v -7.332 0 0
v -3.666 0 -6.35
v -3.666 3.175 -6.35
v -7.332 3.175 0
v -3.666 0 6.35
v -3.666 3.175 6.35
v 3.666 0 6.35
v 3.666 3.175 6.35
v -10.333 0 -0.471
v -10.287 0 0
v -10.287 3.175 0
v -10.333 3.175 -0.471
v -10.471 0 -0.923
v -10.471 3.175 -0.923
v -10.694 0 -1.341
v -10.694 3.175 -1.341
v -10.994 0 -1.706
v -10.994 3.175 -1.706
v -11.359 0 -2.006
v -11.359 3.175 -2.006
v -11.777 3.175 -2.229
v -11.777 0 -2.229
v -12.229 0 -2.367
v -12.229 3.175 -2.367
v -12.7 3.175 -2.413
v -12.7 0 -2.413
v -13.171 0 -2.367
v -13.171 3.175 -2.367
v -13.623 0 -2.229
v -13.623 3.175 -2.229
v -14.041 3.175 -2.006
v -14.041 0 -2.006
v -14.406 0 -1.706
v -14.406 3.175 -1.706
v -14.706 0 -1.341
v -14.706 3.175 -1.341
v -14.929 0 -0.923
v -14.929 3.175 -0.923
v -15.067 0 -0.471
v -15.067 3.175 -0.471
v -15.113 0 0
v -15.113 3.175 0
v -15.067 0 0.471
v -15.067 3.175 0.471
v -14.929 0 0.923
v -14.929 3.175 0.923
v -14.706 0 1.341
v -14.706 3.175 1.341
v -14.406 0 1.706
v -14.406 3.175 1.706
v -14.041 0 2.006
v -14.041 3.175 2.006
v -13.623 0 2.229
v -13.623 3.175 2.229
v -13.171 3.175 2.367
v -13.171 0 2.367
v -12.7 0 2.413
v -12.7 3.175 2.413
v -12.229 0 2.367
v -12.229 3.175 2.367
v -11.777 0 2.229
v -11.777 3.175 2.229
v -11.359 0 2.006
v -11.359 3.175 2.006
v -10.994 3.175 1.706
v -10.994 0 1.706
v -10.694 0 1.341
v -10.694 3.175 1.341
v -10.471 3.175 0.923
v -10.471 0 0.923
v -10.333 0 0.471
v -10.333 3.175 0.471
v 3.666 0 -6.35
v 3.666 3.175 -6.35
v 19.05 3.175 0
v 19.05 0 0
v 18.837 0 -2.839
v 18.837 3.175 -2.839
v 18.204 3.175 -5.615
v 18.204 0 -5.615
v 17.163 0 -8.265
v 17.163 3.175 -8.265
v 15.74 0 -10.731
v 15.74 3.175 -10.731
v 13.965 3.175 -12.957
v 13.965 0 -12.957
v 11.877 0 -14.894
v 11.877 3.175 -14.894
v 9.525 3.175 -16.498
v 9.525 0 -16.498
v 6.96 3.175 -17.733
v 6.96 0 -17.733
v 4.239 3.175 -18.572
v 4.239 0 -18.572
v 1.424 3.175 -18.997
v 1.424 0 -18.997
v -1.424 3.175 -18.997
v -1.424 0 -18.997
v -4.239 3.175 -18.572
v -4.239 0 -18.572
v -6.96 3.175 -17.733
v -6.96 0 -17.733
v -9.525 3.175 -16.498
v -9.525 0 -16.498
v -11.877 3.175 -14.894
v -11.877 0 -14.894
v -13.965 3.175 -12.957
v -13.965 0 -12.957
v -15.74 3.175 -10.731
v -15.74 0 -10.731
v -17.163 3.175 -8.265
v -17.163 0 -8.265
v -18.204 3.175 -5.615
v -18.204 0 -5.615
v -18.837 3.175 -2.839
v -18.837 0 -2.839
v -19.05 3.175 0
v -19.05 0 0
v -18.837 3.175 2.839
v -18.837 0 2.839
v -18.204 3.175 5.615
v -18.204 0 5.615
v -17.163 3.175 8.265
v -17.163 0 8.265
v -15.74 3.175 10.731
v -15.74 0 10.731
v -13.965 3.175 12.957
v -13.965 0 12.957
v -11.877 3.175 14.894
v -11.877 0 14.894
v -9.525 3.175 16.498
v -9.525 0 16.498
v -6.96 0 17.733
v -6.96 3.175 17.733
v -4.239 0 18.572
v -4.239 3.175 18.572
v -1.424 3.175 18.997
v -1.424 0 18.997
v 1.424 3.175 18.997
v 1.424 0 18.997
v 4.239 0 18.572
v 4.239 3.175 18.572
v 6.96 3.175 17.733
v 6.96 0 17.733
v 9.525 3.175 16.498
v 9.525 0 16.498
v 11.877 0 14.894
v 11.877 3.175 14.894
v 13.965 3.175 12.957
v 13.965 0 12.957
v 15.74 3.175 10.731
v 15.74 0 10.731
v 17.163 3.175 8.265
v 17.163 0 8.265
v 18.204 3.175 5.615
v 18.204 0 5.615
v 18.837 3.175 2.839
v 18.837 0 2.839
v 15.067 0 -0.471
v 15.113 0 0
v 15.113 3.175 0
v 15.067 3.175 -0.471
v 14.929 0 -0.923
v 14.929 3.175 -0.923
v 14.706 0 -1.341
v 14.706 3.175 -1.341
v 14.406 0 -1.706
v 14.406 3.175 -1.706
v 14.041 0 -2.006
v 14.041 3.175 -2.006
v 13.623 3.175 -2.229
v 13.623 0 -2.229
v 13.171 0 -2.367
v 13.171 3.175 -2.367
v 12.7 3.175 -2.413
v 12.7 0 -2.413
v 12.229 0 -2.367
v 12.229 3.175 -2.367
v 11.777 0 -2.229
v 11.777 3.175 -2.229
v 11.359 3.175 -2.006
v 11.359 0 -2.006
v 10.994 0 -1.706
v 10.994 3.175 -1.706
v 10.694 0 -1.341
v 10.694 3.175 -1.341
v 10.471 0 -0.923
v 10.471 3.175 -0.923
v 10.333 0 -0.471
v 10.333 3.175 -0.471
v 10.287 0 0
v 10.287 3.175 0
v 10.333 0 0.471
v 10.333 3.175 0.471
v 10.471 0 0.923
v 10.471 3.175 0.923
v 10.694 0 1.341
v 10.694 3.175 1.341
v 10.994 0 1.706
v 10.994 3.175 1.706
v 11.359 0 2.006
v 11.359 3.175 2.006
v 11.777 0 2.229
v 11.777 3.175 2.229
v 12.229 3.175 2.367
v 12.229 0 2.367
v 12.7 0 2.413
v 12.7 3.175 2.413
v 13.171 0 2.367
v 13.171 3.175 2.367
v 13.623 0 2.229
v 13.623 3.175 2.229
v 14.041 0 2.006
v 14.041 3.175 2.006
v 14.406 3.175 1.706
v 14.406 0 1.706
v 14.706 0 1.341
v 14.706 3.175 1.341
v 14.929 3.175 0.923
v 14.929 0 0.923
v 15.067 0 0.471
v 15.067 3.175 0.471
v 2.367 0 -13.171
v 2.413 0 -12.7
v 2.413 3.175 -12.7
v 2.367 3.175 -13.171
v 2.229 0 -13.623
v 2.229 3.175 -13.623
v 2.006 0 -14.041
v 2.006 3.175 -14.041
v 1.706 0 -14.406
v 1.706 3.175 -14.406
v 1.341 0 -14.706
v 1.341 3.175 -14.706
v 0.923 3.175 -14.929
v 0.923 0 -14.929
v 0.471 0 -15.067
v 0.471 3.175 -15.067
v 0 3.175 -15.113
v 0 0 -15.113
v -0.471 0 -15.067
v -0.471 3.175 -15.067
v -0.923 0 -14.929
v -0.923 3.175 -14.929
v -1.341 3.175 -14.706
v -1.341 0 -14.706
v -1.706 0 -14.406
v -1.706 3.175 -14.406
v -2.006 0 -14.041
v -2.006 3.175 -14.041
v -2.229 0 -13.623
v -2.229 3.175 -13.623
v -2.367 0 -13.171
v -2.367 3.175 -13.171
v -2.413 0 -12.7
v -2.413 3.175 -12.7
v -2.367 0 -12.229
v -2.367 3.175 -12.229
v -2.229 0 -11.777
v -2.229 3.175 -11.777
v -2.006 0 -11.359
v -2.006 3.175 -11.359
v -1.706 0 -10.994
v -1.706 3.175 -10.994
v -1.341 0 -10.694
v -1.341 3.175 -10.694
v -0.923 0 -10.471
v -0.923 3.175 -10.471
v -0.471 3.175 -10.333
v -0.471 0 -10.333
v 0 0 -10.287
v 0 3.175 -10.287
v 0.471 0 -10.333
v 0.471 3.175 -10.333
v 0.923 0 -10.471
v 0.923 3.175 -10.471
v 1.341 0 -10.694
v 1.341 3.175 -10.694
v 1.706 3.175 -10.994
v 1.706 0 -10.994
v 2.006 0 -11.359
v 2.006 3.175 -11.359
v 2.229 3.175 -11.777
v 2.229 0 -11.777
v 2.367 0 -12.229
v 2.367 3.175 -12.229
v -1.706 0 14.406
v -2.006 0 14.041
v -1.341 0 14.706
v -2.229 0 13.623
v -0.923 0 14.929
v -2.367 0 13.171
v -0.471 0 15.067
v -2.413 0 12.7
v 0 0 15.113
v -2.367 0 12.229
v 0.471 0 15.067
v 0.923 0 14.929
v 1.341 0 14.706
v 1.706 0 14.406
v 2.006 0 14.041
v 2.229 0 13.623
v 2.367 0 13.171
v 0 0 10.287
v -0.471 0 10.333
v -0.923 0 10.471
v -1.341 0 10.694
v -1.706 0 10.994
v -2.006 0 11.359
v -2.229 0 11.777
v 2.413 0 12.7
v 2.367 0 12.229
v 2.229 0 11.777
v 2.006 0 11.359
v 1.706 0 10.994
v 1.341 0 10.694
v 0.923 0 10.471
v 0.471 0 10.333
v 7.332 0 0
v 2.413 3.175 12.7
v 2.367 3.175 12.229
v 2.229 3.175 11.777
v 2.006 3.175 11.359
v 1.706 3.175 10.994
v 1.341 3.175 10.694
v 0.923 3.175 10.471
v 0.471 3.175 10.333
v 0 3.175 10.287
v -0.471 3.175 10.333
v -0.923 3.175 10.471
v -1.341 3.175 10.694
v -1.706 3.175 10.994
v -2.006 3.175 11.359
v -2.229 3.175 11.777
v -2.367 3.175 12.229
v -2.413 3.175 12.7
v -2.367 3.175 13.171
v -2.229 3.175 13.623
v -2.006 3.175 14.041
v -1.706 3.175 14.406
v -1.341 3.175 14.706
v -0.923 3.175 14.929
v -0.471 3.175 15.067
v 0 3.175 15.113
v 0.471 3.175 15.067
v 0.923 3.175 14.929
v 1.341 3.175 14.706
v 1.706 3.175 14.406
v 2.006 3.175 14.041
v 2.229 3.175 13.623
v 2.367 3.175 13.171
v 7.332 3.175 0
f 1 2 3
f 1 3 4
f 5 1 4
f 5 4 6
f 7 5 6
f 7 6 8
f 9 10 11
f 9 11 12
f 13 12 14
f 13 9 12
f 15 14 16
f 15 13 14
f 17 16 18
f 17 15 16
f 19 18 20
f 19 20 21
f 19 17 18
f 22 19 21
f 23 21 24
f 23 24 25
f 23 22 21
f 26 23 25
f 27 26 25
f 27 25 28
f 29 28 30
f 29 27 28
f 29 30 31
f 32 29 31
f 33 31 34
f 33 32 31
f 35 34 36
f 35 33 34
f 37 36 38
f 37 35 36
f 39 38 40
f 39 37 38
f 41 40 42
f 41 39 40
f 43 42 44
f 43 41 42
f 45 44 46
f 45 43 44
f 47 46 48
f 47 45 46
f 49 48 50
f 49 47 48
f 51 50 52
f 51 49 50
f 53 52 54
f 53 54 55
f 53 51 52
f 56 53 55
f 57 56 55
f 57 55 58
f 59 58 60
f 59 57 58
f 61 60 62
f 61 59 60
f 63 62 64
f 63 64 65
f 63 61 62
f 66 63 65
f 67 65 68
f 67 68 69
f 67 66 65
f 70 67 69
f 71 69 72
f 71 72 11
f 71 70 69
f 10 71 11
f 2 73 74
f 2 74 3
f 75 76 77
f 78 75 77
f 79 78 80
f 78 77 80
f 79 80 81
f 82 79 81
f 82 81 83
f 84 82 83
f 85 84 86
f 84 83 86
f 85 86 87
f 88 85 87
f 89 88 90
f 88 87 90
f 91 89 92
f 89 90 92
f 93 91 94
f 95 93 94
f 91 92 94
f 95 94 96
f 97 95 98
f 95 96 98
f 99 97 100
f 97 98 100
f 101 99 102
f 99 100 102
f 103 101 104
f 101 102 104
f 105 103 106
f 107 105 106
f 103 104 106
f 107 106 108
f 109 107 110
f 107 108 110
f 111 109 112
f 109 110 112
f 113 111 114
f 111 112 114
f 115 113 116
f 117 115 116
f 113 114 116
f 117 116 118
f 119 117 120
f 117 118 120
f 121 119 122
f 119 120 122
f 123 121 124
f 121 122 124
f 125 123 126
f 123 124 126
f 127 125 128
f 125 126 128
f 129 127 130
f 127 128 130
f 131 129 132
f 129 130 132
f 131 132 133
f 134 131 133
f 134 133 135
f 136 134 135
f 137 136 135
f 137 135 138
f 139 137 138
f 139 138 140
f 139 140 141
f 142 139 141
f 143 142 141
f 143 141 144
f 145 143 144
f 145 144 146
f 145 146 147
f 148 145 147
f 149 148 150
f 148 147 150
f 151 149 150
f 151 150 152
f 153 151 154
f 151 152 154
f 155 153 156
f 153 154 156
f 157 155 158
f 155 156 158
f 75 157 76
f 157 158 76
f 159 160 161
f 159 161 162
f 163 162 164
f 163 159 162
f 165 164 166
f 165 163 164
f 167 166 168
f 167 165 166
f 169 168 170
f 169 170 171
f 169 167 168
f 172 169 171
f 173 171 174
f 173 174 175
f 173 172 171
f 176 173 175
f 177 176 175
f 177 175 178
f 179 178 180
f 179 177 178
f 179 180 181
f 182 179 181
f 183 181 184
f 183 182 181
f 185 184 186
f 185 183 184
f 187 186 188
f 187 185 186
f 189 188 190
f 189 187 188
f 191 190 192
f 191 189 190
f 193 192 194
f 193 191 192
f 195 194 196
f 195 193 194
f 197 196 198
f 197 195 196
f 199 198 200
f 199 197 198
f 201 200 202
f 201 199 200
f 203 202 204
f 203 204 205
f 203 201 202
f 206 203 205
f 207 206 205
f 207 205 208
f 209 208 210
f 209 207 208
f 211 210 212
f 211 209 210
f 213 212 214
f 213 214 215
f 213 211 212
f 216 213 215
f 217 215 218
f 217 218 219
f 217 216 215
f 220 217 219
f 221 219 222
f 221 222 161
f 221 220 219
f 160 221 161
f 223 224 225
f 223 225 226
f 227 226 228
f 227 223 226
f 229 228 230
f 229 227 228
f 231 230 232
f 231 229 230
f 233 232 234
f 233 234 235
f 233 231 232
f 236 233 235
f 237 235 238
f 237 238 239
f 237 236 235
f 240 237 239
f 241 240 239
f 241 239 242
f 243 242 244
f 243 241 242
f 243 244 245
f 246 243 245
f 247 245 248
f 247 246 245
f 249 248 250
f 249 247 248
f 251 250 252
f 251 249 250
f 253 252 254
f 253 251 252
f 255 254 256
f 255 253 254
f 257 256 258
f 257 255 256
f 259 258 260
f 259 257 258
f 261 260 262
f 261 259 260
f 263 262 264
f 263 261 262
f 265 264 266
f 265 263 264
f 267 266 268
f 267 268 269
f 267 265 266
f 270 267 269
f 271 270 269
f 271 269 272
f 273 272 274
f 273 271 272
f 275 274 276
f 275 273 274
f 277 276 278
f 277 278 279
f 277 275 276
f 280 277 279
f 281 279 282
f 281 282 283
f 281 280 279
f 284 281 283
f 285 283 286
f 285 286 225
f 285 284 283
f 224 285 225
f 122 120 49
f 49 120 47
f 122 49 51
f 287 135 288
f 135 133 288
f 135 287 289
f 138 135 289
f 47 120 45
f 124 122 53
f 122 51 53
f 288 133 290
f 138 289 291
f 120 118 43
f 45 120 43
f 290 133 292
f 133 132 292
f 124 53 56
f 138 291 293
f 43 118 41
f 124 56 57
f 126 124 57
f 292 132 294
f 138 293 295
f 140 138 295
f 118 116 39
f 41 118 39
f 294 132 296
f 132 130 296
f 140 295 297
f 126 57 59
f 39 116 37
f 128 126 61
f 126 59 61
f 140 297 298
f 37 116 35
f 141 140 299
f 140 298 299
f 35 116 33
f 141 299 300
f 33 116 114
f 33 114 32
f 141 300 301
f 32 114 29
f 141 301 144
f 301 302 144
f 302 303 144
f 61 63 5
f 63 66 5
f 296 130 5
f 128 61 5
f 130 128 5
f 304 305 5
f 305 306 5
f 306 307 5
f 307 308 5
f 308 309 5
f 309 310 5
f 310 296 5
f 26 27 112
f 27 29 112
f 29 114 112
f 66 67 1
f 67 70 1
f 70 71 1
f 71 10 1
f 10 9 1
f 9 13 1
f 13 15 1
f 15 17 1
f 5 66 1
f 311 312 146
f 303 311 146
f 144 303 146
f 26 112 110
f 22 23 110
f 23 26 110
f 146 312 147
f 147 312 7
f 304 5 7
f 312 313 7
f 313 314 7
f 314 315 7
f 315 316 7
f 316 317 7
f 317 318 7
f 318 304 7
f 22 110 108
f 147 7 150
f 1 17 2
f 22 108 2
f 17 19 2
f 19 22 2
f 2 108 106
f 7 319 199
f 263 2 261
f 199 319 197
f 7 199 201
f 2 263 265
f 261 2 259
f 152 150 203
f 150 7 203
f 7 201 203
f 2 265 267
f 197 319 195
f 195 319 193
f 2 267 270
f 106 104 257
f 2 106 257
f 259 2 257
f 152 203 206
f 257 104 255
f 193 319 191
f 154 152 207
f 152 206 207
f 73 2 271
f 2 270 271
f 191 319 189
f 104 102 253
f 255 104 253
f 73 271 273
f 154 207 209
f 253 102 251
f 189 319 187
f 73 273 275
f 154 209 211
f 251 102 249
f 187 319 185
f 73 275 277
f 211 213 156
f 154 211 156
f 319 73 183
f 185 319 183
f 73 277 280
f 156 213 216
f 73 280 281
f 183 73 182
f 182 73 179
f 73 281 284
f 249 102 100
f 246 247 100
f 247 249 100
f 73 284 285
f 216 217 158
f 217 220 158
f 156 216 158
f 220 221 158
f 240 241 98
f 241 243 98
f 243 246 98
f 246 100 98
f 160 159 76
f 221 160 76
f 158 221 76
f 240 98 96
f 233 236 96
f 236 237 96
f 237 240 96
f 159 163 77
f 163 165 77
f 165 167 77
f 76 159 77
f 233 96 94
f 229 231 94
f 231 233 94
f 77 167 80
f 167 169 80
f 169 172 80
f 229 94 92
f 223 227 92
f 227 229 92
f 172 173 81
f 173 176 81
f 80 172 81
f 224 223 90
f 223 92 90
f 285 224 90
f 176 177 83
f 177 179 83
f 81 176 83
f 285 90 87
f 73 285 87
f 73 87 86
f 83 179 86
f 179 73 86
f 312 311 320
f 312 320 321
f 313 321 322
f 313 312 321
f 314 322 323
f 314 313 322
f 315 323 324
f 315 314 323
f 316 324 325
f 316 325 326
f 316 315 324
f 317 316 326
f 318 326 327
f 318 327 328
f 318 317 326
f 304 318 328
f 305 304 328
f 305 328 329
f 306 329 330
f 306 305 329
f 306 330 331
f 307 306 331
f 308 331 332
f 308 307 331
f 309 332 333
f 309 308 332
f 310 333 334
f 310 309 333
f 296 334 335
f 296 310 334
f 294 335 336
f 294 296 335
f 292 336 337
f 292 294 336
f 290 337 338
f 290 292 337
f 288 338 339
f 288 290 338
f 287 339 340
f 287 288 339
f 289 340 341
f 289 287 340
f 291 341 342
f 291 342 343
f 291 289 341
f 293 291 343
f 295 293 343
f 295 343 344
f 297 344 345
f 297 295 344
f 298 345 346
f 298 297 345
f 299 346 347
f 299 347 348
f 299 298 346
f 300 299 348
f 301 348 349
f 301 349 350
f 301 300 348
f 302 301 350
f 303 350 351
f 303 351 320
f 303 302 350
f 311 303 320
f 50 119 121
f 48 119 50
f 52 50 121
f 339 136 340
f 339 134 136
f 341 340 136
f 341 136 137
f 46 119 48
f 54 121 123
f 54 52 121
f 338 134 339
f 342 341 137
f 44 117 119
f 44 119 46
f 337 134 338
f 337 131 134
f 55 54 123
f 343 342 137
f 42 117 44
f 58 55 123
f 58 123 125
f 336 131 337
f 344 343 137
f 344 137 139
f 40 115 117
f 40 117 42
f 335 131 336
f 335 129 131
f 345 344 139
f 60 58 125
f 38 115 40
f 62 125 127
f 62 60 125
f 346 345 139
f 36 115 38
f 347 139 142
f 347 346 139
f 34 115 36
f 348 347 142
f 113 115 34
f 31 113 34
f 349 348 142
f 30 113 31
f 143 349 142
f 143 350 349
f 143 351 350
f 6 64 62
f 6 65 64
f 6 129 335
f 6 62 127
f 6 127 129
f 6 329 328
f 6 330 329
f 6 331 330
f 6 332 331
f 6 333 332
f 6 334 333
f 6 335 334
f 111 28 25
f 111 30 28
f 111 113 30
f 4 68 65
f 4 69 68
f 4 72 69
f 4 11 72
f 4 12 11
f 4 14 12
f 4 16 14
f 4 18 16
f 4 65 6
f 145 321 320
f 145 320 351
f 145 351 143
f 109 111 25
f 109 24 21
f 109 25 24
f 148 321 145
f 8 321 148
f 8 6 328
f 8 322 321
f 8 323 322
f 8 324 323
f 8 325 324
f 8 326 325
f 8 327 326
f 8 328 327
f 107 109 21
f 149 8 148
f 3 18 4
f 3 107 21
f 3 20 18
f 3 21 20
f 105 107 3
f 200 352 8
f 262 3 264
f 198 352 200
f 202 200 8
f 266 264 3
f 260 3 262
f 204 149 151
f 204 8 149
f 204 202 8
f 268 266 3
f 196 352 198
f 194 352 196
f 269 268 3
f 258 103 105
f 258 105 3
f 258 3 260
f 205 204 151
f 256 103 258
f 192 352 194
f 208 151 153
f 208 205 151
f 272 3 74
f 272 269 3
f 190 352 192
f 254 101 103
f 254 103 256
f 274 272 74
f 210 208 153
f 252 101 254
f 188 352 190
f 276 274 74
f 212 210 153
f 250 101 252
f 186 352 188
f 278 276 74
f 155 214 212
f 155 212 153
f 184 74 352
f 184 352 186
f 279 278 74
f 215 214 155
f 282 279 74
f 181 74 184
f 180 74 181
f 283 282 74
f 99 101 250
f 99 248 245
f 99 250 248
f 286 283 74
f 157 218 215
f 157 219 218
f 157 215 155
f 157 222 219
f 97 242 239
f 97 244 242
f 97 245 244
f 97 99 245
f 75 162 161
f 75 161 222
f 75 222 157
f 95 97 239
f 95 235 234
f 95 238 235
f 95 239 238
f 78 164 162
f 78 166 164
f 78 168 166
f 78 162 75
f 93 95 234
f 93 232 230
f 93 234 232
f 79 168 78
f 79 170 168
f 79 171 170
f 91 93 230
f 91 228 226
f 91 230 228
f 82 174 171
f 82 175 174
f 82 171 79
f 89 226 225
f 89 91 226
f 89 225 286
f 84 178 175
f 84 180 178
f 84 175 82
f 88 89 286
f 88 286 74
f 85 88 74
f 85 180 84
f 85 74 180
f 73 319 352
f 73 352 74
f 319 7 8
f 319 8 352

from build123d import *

# Parameters (mm, degrees)
SKETCH1_R           = 19.05
SKETCH1_R_2         = 2.413
BOSS_EXTRUDE1_DEPTH = 3.175


with BuildPart() as part:
    # Sketch1 → Boss-Extrude1 (new body)
    with BuildSketch(Plane(origin=(0, 0, 0), x_dir=(1, 0, 0), z_dir=(0, 1, 0))):
        Circle(SKETCH1_R)
        with Locations((0, 12.7)):
            Circle(SKETCH1_R_2, mode=Mode.SUBTRACT)
        with Locations((12.7, 0)):
            Circle(SKETCH1_R_2, mode=Mode.SUBTRACT)
        with Locations((0, -12.7)):
            Circle(SKETCH1_R_2, mode=Mode.SUBTRACT)
        with Locations((-12.7, 0)):
            Circle(SKETCH1_R_2, mode=Mode.SUBTRACT)
        Polygon((-7.332348419, 0), (-3.666174209, -6.35), (3.666174209, -6.35), (7.332348419, 0), (3.666174209, 6.35), (-3.666174209, 6.35), align=None, mode=Mode.SUBTRACT)
    extrude(amount=BOSS_EXTRUDE1_DEPTH)


solid = part.part
